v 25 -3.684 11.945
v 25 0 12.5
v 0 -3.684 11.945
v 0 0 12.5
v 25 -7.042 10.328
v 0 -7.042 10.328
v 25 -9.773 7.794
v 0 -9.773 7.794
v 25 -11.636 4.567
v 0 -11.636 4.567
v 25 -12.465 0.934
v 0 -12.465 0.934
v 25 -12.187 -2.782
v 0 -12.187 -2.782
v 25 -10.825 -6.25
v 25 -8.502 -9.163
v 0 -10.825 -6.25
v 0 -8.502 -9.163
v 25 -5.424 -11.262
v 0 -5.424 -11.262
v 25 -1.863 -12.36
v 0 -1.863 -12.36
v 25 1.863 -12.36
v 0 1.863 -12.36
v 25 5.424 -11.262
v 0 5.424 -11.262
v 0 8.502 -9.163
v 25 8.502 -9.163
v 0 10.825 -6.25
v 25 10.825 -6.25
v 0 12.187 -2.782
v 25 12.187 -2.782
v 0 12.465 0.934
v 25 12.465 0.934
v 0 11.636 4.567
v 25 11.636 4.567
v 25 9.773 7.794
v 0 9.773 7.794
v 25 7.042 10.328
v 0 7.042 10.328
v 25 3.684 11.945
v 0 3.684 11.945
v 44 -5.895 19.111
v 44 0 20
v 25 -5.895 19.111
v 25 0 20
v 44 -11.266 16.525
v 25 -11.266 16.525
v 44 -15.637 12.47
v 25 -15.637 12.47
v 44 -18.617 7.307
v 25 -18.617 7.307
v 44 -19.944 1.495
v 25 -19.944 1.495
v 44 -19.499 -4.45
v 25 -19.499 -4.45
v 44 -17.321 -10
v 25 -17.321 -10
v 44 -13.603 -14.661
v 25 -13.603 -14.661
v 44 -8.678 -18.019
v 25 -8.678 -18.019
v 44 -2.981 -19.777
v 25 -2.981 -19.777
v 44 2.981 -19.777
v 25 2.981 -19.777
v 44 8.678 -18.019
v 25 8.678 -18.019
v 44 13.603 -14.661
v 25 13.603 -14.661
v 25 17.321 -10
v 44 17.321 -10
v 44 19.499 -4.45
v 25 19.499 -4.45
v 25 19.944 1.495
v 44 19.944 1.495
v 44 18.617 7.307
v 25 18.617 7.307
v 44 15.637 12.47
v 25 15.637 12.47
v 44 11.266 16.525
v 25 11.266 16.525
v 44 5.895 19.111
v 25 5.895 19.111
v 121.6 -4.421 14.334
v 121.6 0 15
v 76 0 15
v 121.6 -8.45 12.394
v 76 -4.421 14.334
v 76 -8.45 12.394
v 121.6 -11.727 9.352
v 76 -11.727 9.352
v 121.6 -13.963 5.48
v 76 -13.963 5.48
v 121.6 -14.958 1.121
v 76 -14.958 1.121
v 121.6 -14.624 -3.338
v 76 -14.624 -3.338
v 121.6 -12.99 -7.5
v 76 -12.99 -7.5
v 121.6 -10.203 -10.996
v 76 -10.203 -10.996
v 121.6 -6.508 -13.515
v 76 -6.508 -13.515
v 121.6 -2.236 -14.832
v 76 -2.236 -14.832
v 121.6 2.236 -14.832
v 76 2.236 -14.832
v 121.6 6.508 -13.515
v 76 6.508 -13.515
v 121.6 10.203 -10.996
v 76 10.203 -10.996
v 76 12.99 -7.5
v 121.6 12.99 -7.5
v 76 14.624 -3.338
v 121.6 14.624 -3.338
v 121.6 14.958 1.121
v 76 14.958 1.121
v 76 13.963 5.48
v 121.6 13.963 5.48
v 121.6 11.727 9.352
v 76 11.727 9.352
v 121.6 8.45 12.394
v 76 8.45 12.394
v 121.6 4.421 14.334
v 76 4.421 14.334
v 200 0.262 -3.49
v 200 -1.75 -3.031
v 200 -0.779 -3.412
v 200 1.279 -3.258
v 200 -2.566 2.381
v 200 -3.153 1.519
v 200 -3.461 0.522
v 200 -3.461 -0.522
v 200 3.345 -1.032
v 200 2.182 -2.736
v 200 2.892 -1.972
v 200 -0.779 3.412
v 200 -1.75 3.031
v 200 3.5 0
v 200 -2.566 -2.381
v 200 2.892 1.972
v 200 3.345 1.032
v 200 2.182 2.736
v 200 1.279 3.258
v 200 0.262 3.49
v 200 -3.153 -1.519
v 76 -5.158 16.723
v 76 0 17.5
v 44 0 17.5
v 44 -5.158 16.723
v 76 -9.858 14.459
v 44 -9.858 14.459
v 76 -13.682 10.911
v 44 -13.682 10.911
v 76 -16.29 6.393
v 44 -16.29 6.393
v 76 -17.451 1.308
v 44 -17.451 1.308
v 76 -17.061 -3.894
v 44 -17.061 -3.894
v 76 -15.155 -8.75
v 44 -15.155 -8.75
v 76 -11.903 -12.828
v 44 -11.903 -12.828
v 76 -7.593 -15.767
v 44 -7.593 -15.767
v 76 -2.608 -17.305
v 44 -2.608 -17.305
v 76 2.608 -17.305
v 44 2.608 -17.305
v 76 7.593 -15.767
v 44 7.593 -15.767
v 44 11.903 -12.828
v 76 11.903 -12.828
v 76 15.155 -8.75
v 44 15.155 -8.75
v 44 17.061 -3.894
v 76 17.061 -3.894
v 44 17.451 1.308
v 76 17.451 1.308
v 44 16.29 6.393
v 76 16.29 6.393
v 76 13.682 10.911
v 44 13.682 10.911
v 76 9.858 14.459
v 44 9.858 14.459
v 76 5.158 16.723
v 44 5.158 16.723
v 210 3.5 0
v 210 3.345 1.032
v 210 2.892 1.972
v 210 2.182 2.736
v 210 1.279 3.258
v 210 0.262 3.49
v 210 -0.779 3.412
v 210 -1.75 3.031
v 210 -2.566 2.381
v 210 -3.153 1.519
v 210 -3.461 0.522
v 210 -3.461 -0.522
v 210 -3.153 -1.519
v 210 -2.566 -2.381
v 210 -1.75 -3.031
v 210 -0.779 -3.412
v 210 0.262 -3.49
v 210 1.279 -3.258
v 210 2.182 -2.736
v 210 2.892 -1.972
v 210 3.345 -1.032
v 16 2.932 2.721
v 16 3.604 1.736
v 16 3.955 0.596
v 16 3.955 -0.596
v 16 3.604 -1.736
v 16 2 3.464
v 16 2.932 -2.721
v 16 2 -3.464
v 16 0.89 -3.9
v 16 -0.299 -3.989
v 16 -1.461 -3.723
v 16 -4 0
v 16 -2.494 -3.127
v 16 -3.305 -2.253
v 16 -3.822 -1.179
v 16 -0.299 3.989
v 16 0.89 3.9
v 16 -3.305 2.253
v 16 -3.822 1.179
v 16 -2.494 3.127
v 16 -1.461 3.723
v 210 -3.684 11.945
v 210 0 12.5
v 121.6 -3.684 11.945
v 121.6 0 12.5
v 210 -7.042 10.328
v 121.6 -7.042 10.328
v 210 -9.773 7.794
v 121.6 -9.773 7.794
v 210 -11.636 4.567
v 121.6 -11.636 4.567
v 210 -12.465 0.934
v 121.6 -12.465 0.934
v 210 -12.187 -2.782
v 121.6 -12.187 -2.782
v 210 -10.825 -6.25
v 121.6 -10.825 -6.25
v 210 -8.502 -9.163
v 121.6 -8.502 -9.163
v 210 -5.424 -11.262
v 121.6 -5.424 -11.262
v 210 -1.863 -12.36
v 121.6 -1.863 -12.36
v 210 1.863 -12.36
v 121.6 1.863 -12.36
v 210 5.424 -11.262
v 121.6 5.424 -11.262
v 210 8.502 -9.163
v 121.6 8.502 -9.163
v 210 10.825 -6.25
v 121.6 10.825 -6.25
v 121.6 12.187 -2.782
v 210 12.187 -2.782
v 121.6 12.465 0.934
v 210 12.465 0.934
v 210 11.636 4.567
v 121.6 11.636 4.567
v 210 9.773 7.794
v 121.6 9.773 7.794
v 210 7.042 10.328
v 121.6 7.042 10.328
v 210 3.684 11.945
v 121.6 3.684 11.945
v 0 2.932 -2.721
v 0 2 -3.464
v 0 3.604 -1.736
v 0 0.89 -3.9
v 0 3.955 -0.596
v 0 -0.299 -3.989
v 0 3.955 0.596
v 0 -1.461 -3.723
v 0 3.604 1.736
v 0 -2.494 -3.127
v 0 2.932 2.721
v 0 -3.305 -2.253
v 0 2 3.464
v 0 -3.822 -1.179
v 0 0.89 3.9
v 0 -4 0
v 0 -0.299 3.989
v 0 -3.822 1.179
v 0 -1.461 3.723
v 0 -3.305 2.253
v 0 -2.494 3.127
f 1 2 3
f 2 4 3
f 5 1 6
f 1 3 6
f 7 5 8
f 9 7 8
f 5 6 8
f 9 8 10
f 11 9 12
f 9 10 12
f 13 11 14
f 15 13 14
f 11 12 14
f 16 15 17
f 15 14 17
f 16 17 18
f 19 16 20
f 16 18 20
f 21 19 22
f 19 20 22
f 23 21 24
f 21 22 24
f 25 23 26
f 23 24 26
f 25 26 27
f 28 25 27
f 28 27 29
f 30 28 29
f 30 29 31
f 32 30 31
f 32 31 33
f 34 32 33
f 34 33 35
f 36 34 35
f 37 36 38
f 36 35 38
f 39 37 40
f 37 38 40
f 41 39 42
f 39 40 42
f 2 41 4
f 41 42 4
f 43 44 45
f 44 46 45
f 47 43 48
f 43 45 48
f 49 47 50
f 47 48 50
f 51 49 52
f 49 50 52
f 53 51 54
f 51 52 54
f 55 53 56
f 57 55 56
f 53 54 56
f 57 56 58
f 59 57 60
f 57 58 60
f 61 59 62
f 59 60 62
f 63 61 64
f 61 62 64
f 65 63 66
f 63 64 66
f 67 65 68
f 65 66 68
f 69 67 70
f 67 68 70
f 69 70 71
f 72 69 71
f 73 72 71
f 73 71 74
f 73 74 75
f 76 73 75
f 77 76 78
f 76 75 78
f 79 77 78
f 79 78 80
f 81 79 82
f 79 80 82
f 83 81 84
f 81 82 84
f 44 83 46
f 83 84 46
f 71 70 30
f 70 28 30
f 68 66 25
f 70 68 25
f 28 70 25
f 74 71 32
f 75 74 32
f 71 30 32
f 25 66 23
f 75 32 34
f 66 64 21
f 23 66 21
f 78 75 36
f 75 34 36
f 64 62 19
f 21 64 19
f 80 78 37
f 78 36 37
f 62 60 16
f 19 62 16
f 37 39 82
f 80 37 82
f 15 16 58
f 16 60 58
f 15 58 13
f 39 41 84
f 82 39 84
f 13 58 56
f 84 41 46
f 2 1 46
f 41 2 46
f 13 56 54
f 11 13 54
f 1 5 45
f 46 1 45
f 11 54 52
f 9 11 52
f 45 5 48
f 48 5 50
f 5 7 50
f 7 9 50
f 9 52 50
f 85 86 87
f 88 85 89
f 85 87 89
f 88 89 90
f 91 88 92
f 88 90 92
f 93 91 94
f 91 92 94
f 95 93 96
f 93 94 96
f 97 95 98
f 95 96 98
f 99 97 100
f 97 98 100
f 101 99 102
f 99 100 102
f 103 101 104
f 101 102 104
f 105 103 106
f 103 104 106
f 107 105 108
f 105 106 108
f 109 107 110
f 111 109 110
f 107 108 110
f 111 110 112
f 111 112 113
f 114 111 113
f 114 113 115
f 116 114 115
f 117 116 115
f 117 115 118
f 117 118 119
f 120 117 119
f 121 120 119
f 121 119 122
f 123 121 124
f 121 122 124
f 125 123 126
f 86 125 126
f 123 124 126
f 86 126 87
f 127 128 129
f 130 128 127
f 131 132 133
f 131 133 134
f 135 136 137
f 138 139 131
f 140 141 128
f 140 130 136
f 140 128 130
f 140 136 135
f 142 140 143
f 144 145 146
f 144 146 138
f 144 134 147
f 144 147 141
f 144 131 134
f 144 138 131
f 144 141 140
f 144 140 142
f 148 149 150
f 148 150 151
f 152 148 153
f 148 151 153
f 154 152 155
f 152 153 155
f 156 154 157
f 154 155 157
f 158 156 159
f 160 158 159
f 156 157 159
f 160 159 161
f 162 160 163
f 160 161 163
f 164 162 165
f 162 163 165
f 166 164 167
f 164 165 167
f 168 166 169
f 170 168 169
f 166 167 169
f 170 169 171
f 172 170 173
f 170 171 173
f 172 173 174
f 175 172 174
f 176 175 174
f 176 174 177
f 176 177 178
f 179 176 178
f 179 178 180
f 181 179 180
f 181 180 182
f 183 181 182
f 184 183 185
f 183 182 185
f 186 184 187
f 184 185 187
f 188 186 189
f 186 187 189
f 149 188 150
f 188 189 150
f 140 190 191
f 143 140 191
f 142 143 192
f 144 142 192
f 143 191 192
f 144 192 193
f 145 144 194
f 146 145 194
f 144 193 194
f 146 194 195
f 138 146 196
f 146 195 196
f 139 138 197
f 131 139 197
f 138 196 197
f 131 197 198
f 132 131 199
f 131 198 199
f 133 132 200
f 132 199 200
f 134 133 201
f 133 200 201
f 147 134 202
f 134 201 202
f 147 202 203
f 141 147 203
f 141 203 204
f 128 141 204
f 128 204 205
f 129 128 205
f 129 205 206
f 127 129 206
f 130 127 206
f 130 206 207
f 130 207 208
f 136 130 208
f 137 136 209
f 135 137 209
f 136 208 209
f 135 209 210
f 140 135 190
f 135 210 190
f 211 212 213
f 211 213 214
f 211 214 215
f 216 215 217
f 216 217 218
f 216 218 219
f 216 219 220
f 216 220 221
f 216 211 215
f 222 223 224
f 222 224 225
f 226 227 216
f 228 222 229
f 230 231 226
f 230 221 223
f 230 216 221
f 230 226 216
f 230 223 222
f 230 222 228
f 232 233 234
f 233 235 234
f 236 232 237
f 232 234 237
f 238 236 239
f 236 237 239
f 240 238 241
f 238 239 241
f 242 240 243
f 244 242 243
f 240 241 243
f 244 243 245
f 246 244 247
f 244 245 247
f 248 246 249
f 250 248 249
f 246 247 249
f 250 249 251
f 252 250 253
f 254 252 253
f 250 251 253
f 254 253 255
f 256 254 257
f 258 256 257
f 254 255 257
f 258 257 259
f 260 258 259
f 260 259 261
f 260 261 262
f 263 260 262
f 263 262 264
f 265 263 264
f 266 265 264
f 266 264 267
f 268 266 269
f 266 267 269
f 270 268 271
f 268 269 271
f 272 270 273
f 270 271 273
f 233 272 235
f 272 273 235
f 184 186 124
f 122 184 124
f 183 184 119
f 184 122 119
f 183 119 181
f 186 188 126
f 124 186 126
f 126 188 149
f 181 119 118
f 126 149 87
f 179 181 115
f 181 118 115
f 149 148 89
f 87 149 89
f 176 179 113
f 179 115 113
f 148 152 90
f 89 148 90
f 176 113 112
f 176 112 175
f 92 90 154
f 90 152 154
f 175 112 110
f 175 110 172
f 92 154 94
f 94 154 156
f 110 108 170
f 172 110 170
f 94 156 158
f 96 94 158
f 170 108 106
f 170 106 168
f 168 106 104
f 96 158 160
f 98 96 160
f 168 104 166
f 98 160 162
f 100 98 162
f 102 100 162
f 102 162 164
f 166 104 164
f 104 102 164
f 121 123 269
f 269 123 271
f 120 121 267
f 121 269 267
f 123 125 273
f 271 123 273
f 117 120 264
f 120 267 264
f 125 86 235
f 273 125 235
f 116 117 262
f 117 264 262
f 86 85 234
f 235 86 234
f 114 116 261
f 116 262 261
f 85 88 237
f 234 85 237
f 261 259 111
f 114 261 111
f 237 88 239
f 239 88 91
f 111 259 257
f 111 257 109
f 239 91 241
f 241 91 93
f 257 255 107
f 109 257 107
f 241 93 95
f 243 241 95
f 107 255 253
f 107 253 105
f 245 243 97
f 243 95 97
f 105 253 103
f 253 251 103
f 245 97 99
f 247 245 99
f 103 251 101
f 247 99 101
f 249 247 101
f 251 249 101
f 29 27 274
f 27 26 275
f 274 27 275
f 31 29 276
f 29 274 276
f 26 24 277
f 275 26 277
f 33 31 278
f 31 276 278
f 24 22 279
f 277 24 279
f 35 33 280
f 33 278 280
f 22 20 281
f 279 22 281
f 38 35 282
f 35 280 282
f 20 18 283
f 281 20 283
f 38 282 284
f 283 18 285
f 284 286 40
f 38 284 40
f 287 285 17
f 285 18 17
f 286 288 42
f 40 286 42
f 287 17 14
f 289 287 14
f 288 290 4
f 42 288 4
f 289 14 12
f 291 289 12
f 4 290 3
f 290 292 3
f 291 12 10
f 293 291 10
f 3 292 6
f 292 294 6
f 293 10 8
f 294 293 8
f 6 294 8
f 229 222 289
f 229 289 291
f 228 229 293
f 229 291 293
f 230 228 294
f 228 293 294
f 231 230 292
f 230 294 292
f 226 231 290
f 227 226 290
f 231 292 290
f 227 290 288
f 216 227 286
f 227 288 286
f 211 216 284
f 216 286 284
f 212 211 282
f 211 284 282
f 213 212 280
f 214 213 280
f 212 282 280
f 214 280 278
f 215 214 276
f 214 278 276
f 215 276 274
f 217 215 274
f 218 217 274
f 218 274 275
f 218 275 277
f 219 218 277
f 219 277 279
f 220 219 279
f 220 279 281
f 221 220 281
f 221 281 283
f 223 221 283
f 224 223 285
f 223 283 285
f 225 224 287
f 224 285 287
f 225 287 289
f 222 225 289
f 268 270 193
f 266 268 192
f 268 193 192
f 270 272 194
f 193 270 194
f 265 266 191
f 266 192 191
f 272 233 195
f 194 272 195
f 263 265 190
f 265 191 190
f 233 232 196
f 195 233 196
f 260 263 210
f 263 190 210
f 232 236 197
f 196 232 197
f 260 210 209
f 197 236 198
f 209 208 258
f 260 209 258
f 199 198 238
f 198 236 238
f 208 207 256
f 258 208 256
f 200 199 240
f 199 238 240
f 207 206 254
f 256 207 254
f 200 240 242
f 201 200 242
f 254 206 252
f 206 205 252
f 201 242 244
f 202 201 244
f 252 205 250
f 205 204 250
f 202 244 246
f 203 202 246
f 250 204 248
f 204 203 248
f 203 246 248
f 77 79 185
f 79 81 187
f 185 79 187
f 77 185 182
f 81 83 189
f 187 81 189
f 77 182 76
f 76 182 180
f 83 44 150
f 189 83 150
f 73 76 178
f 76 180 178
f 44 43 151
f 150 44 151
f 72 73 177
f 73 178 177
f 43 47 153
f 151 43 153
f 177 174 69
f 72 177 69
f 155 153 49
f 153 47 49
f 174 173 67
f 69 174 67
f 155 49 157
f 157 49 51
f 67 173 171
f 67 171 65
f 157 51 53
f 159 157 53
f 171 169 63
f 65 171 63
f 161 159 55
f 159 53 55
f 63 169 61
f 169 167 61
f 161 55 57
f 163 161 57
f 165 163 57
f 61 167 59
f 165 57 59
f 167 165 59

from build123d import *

# Parameters (mm, degrees)
F2_R     = 4
F3_DEPTH = 16
F4_R     = 3.5
F5_DEPTH = 10


with BuildPart() as f1:
    # F0 (on Front) → F1 (revolve)
    with BuildSketch(Plane.XZ):
        Polygon((0, 12.5), (0, 0), (210, 0), (210, 12.5), (121.6, 12.5), (121.6, 15), (76, 15), (76, 17.5), (44, 17.5), (44, 20), (25, 20), (25, 12.5), align=None)
    revolve(axis=Axis((106.720138, 0, 0), (1, 0, 0)))

    # F2 (on face) → F3 (cut)
    with BuildSketch(Plane(origin=(0, 0, 0), x_dir=(0, -1, 0), z_dir=(-1, 0, 0))):
        Circle(F2_R)
    extrude(amount=-F3_DEPTH, mode=Mode.SUBTRACT)

    # F4 (on face) → F5 (cut)
    with BuildSketch(Plane.YZ.offset(210)):
        Circle(F4_R)
    extrude(amount=-F5_DEPTH, mode=Mode.SUBTRACT)


solid = f1.part
